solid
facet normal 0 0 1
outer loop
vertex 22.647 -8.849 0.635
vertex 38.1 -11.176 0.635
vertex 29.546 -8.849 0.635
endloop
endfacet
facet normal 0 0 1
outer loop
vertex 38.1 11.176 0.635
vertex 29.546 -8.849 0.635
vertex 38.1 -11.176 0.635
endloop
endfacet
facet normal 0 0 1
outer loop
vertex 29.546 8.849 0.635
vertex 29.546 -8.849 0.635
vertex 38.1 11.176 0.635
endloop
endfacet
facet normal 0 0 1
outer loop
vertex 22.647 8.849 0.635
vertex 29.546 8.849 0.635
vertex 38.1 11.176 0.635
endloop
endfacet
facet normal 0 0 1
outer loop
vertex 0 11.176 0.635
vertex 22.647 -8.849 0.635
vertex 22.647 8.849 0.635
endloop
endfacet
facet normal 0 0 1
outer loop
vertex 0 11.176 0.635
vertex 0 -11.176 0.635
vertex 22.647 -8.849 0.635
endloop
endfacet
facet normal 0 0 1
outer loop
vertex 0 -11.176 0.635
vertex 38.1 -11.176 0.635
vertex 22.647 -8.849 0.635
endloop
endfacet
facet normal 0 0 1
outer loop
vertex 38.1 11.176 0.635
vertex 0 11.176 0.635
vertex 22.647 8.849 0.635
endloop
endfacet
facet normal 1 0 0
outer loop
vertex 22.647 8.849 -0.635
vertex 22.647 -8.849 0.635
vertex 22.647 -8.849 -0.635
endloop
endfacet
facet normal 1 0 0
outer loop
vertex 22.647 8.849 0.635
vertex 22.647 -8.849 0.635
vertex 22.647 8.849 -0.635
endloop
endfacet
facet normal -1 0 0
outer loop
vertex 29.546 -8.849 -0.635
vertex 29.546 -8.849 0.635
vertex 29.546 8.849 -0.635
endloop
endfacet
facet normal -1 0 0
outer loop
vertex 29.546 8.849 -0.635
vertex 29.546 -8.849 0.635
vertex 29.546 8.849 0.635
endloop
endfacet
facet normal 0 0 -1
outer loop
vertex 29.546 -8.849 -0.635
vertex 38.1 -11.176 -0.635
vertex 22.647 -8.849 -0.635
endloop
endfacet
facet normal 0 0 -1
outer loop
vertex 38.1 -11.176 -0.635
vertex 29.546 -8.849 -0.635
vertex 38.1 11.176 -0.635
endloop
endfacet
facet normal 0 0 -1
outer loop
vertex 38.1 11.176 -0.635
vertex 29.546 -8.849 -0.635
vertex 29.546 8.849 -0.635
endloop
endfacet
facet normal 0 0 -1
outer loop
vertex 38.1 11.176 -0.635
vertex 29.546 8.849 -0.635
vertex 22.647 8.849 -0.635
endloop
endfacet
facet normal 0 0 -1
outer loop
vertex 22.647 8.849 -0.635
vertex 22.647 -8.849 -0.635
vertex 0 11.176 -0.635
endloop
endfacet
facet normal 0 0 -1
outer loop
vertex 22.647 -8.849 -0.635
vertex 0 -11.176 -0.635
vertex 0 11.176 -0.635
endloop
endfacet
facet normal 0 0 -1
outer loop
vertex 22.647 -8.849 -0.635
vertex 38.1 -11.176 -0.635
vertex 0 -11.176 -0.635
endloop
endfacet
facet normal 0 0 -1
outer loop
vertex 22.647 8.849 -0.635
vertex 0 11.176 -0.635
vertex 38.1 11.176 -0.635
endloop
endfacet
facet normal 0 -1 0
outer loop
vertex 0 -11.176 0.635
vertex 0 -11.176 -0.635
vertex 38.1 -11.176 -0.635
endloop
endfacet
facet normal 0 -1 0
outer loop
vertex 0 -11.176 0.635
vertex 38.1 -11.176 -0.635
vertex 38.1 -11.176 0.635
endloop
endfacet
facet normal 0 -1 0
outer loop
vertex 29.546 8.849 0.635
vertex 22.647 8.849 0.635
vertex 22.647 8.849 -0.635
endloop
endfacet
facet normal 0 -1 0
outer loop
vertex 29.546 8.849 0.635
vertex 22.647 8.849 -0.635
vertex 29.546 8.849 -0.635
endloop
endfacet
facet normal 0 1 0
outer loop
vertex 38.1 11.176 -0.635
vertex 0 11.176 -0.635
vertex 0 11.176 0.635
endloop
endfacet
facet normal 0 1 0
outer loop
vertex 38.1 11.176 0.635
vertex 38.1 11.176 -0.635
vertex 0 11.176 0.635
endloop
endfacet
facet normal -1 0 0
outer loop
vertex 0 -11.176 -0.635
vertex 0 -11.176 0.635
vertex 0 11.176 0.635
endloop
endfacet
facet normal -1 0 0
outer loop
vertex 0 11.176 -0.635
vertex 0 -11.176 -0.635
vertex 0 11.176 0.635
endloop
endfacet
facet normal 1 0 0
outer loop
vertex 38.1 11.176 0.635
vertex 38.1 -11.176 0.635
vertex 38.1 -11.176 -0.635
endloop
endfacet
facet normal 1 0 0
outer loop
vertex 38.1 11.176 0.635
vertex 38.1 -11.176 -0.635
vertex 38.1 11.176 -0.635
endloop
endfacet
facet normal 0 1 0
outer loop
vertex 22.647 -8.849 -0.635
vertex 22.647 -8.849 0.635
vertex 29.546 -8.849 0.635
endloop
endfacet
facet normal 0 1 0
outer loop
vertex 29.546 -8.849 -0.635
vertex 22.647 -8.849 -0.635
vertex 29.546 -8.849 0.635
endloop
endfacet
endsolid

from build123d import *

# Parameters (mm, degrees)
F0_W          = 22.352
F0_H          = 1.27
F1_DEPTH      = 38.1
F2_W          = 6.8990886211
F2_H          = 17.6976025105
F3_DEPTH      = 25.4
F3_DEPTH_BACK = 25.4


with BuildPart() as f1:
    # F0 (on Right) → F1 (new body)
    with BuildSketch(Plane.YZ):
        Rectangle(F0_W, F0_H)
    extrude(amount=F1_DEPTH)

    # F2 (on Top) → F3 (cut, two sides)
    with BuildSketch(Plane.XY) as f3_sk:
        with Locations((26.0965079069, 0)):
            Rectangle(F2_W, F2_H)
    extrude(amount=-F3_DEPTH, mode=Mode.SUBTRACT)
    extrude(f3_sk.sketch, amount=F3_DEPTH_BACK, mode=Mode.SUBTRACT)


solid = f1.part
